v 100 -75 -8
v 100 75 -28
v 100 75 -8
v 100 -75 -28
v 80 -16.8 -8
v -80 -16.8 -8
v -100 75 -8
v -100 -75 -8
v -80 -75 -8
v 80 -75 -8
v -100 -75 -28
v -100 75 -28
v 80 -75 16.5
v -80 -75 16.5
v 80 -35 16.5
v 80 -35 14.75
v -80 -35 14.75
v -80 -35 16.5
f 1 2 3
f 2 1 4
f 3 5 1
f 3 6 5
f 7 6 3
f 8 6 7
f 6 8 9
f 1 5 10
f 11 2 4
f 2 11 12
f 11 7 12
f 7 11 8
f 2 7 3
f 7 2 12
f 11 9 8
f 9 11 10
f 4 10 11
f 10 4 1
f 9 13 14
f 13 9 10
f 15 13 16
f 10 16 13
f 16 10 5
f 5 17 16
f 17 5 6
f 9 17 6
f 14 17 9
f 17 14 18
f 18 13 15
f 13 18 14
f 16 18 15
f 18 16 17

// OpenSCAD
// Import the Poppy face model. Use simple shapes to cut out the actual face,
// leaving only the collar which screws into the back of the head.

// Load the face
module load_stl() {
 import("face_raw.stl");
}

module base() {
    translate([0,0,-18]) {
        cube( size=[200,150,20],center=true);
    }
}

// Use a triangular prism to block out the neck area.
module prism() {
    
 translate([80,-16,16]) {
 rotate([0,90,180]) {
     linear_extrude(height=160) {
    polygon([[25,20],[0,20],[25,0]]);
 }}}
}
module neck() {
    translate([0,-55,4]) {
        cube( size=[160,40,25],center=true);
    }
}
union() {
    //load_stl();
    base();
    prism();
    neck();
}
